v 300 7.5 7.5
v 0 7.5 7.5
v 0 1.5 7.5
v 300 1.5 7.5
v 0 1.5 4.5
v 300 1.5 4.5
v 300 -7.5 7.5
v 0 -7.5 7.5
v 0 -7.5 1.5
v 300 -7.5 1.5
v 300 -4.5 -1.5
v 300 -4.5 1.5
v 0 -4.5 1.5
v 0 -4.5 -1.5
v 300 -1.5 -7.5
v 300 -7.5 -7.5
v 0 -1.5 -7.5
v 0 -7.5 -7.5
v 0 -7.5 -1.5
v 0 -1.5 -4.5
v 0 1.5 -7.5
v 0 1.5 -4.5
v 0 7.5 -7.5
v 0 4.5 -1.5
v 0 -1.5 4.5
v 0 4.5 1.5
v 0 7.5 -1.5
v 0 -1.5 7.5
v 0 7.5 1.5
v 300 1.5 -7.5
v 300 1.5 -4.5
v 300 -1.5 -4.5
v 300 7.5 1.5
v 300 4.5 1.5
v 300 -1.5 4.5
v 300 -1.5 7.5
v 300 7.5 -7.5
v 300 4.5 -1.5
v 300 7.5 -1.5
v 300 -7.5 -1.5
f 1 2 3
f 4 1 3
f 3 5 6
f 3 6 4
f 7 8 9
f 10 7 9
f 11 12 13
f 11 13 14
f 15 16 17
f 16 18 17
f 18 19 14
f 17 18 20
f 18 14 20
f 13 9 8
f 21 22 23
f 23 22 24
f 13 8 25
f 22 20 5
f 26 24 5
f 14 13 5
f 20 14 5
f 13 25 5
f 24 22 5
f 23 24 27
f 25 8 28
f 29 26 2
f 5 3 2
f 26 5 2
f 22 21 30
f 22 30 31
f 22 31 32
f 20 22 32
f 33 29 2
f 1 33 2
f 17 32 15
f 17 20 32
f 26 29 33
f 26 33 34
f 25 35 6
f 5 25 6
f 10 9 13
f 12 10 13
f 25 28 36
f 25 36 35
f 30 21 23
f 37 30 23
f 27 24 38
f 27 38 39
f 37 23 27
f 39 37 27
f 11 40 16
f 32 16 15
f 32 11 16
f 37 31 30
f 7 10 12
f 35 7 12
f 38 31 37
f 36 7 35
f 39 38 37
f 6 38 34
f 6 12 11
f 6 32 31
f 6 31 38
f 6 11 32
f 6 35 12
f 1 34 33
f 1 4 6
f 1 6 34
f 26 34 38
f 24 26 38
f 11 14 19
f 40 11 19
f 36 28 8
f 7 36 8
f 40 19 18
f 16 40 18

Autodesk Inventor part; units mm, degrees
ref_plane "YZ Plane" through (0, 0, 0) normal (1, 0, 0) x (0, 1, 0)
ref_plane "XZ Plane" through (0, 0, 0) normal (0, 1, 0) x (-1, 0, 0)
ref_plane "XY Plane" through (0, 0, 0) normal (0, 0, 1) x (1, 0, 0)
sketch "Sketch1" plane through (0, 0, 0) normal (1, 0, 0) x (0, 1, 0)
  line L0 (-7.5, -7.5) -> (7.5, -7.5)
  line L1 (7.5, -7.5) -> (7.5, 7.5)
  line L2 (7.5, 7.5) -> (-7.5, 7.5)
  line L3 (-7.5, 7.5) -> (-7.5, -7.5)
  line L4 (-7.5, -7.5) -> (7.5, 7.5) construction
  line L5 (7.5, -7.5) -> (-7.5, 7.5) construction
  line L6 (7.5, 1.5) -> (4.5, 1.5)
  line L7 (4.5, 1.5) -> (4.5, -1.5)
  line L8 (4.5, -1.5) -> (7.5, -1.5)
  line L9 (7.5, -1.5) -> (7.5, 1.5)
  line L10 (1.5, 7.5) -> (-1.5, 7.5)
  line L11 (-1.5, 7.5) -> (-1.5, 4.5)
  line L12 (-1.5, 4.5) -> (1.5, 4.5)
  line L13 (1.5, 4.5) -> (1.5, 7.5)
  line L14 (-7.5, 1.5) -> (-4.5, 1.5)
  line L15 (-4.5, 1.5) -> (-4.5, -1.5)
  line L16 (-4.5, -1.5) -> (-7.5, -1.5)
  line L17 (-7.5, -1.5) -> (-7.5, 1.5)
  line L18 (-1.5, -7.5) -> (1.5, -7.5)
  line L19 (1.5, -7.5) -> (1.5, -4.5)
  line L20 (1.5, -4.5) -> (-1.5, -4.5)
  line L21 (-1.5, -4.5) -> (-1.5, -7.5)
  point P0 (0, 0)
  dimension "d0" = 15
  dimension "d1" = 3
  dimension "d2" = 3
  dimension "d3" = 1.5
  dimension "d4" = 1.5
extrude "Extrusion1" add sketch "Sketch1" along normal blind 300 contours L3 L16 L15 L14 L2 L11 L12 L13 L1 L6 L7 L8 L0 L19 L20 L21
equation "\"d3\" = 0.5 * d2"
equation "\"d4\" = d3"
properties part number "Beam_300mm" material "Aluminum 6061"
